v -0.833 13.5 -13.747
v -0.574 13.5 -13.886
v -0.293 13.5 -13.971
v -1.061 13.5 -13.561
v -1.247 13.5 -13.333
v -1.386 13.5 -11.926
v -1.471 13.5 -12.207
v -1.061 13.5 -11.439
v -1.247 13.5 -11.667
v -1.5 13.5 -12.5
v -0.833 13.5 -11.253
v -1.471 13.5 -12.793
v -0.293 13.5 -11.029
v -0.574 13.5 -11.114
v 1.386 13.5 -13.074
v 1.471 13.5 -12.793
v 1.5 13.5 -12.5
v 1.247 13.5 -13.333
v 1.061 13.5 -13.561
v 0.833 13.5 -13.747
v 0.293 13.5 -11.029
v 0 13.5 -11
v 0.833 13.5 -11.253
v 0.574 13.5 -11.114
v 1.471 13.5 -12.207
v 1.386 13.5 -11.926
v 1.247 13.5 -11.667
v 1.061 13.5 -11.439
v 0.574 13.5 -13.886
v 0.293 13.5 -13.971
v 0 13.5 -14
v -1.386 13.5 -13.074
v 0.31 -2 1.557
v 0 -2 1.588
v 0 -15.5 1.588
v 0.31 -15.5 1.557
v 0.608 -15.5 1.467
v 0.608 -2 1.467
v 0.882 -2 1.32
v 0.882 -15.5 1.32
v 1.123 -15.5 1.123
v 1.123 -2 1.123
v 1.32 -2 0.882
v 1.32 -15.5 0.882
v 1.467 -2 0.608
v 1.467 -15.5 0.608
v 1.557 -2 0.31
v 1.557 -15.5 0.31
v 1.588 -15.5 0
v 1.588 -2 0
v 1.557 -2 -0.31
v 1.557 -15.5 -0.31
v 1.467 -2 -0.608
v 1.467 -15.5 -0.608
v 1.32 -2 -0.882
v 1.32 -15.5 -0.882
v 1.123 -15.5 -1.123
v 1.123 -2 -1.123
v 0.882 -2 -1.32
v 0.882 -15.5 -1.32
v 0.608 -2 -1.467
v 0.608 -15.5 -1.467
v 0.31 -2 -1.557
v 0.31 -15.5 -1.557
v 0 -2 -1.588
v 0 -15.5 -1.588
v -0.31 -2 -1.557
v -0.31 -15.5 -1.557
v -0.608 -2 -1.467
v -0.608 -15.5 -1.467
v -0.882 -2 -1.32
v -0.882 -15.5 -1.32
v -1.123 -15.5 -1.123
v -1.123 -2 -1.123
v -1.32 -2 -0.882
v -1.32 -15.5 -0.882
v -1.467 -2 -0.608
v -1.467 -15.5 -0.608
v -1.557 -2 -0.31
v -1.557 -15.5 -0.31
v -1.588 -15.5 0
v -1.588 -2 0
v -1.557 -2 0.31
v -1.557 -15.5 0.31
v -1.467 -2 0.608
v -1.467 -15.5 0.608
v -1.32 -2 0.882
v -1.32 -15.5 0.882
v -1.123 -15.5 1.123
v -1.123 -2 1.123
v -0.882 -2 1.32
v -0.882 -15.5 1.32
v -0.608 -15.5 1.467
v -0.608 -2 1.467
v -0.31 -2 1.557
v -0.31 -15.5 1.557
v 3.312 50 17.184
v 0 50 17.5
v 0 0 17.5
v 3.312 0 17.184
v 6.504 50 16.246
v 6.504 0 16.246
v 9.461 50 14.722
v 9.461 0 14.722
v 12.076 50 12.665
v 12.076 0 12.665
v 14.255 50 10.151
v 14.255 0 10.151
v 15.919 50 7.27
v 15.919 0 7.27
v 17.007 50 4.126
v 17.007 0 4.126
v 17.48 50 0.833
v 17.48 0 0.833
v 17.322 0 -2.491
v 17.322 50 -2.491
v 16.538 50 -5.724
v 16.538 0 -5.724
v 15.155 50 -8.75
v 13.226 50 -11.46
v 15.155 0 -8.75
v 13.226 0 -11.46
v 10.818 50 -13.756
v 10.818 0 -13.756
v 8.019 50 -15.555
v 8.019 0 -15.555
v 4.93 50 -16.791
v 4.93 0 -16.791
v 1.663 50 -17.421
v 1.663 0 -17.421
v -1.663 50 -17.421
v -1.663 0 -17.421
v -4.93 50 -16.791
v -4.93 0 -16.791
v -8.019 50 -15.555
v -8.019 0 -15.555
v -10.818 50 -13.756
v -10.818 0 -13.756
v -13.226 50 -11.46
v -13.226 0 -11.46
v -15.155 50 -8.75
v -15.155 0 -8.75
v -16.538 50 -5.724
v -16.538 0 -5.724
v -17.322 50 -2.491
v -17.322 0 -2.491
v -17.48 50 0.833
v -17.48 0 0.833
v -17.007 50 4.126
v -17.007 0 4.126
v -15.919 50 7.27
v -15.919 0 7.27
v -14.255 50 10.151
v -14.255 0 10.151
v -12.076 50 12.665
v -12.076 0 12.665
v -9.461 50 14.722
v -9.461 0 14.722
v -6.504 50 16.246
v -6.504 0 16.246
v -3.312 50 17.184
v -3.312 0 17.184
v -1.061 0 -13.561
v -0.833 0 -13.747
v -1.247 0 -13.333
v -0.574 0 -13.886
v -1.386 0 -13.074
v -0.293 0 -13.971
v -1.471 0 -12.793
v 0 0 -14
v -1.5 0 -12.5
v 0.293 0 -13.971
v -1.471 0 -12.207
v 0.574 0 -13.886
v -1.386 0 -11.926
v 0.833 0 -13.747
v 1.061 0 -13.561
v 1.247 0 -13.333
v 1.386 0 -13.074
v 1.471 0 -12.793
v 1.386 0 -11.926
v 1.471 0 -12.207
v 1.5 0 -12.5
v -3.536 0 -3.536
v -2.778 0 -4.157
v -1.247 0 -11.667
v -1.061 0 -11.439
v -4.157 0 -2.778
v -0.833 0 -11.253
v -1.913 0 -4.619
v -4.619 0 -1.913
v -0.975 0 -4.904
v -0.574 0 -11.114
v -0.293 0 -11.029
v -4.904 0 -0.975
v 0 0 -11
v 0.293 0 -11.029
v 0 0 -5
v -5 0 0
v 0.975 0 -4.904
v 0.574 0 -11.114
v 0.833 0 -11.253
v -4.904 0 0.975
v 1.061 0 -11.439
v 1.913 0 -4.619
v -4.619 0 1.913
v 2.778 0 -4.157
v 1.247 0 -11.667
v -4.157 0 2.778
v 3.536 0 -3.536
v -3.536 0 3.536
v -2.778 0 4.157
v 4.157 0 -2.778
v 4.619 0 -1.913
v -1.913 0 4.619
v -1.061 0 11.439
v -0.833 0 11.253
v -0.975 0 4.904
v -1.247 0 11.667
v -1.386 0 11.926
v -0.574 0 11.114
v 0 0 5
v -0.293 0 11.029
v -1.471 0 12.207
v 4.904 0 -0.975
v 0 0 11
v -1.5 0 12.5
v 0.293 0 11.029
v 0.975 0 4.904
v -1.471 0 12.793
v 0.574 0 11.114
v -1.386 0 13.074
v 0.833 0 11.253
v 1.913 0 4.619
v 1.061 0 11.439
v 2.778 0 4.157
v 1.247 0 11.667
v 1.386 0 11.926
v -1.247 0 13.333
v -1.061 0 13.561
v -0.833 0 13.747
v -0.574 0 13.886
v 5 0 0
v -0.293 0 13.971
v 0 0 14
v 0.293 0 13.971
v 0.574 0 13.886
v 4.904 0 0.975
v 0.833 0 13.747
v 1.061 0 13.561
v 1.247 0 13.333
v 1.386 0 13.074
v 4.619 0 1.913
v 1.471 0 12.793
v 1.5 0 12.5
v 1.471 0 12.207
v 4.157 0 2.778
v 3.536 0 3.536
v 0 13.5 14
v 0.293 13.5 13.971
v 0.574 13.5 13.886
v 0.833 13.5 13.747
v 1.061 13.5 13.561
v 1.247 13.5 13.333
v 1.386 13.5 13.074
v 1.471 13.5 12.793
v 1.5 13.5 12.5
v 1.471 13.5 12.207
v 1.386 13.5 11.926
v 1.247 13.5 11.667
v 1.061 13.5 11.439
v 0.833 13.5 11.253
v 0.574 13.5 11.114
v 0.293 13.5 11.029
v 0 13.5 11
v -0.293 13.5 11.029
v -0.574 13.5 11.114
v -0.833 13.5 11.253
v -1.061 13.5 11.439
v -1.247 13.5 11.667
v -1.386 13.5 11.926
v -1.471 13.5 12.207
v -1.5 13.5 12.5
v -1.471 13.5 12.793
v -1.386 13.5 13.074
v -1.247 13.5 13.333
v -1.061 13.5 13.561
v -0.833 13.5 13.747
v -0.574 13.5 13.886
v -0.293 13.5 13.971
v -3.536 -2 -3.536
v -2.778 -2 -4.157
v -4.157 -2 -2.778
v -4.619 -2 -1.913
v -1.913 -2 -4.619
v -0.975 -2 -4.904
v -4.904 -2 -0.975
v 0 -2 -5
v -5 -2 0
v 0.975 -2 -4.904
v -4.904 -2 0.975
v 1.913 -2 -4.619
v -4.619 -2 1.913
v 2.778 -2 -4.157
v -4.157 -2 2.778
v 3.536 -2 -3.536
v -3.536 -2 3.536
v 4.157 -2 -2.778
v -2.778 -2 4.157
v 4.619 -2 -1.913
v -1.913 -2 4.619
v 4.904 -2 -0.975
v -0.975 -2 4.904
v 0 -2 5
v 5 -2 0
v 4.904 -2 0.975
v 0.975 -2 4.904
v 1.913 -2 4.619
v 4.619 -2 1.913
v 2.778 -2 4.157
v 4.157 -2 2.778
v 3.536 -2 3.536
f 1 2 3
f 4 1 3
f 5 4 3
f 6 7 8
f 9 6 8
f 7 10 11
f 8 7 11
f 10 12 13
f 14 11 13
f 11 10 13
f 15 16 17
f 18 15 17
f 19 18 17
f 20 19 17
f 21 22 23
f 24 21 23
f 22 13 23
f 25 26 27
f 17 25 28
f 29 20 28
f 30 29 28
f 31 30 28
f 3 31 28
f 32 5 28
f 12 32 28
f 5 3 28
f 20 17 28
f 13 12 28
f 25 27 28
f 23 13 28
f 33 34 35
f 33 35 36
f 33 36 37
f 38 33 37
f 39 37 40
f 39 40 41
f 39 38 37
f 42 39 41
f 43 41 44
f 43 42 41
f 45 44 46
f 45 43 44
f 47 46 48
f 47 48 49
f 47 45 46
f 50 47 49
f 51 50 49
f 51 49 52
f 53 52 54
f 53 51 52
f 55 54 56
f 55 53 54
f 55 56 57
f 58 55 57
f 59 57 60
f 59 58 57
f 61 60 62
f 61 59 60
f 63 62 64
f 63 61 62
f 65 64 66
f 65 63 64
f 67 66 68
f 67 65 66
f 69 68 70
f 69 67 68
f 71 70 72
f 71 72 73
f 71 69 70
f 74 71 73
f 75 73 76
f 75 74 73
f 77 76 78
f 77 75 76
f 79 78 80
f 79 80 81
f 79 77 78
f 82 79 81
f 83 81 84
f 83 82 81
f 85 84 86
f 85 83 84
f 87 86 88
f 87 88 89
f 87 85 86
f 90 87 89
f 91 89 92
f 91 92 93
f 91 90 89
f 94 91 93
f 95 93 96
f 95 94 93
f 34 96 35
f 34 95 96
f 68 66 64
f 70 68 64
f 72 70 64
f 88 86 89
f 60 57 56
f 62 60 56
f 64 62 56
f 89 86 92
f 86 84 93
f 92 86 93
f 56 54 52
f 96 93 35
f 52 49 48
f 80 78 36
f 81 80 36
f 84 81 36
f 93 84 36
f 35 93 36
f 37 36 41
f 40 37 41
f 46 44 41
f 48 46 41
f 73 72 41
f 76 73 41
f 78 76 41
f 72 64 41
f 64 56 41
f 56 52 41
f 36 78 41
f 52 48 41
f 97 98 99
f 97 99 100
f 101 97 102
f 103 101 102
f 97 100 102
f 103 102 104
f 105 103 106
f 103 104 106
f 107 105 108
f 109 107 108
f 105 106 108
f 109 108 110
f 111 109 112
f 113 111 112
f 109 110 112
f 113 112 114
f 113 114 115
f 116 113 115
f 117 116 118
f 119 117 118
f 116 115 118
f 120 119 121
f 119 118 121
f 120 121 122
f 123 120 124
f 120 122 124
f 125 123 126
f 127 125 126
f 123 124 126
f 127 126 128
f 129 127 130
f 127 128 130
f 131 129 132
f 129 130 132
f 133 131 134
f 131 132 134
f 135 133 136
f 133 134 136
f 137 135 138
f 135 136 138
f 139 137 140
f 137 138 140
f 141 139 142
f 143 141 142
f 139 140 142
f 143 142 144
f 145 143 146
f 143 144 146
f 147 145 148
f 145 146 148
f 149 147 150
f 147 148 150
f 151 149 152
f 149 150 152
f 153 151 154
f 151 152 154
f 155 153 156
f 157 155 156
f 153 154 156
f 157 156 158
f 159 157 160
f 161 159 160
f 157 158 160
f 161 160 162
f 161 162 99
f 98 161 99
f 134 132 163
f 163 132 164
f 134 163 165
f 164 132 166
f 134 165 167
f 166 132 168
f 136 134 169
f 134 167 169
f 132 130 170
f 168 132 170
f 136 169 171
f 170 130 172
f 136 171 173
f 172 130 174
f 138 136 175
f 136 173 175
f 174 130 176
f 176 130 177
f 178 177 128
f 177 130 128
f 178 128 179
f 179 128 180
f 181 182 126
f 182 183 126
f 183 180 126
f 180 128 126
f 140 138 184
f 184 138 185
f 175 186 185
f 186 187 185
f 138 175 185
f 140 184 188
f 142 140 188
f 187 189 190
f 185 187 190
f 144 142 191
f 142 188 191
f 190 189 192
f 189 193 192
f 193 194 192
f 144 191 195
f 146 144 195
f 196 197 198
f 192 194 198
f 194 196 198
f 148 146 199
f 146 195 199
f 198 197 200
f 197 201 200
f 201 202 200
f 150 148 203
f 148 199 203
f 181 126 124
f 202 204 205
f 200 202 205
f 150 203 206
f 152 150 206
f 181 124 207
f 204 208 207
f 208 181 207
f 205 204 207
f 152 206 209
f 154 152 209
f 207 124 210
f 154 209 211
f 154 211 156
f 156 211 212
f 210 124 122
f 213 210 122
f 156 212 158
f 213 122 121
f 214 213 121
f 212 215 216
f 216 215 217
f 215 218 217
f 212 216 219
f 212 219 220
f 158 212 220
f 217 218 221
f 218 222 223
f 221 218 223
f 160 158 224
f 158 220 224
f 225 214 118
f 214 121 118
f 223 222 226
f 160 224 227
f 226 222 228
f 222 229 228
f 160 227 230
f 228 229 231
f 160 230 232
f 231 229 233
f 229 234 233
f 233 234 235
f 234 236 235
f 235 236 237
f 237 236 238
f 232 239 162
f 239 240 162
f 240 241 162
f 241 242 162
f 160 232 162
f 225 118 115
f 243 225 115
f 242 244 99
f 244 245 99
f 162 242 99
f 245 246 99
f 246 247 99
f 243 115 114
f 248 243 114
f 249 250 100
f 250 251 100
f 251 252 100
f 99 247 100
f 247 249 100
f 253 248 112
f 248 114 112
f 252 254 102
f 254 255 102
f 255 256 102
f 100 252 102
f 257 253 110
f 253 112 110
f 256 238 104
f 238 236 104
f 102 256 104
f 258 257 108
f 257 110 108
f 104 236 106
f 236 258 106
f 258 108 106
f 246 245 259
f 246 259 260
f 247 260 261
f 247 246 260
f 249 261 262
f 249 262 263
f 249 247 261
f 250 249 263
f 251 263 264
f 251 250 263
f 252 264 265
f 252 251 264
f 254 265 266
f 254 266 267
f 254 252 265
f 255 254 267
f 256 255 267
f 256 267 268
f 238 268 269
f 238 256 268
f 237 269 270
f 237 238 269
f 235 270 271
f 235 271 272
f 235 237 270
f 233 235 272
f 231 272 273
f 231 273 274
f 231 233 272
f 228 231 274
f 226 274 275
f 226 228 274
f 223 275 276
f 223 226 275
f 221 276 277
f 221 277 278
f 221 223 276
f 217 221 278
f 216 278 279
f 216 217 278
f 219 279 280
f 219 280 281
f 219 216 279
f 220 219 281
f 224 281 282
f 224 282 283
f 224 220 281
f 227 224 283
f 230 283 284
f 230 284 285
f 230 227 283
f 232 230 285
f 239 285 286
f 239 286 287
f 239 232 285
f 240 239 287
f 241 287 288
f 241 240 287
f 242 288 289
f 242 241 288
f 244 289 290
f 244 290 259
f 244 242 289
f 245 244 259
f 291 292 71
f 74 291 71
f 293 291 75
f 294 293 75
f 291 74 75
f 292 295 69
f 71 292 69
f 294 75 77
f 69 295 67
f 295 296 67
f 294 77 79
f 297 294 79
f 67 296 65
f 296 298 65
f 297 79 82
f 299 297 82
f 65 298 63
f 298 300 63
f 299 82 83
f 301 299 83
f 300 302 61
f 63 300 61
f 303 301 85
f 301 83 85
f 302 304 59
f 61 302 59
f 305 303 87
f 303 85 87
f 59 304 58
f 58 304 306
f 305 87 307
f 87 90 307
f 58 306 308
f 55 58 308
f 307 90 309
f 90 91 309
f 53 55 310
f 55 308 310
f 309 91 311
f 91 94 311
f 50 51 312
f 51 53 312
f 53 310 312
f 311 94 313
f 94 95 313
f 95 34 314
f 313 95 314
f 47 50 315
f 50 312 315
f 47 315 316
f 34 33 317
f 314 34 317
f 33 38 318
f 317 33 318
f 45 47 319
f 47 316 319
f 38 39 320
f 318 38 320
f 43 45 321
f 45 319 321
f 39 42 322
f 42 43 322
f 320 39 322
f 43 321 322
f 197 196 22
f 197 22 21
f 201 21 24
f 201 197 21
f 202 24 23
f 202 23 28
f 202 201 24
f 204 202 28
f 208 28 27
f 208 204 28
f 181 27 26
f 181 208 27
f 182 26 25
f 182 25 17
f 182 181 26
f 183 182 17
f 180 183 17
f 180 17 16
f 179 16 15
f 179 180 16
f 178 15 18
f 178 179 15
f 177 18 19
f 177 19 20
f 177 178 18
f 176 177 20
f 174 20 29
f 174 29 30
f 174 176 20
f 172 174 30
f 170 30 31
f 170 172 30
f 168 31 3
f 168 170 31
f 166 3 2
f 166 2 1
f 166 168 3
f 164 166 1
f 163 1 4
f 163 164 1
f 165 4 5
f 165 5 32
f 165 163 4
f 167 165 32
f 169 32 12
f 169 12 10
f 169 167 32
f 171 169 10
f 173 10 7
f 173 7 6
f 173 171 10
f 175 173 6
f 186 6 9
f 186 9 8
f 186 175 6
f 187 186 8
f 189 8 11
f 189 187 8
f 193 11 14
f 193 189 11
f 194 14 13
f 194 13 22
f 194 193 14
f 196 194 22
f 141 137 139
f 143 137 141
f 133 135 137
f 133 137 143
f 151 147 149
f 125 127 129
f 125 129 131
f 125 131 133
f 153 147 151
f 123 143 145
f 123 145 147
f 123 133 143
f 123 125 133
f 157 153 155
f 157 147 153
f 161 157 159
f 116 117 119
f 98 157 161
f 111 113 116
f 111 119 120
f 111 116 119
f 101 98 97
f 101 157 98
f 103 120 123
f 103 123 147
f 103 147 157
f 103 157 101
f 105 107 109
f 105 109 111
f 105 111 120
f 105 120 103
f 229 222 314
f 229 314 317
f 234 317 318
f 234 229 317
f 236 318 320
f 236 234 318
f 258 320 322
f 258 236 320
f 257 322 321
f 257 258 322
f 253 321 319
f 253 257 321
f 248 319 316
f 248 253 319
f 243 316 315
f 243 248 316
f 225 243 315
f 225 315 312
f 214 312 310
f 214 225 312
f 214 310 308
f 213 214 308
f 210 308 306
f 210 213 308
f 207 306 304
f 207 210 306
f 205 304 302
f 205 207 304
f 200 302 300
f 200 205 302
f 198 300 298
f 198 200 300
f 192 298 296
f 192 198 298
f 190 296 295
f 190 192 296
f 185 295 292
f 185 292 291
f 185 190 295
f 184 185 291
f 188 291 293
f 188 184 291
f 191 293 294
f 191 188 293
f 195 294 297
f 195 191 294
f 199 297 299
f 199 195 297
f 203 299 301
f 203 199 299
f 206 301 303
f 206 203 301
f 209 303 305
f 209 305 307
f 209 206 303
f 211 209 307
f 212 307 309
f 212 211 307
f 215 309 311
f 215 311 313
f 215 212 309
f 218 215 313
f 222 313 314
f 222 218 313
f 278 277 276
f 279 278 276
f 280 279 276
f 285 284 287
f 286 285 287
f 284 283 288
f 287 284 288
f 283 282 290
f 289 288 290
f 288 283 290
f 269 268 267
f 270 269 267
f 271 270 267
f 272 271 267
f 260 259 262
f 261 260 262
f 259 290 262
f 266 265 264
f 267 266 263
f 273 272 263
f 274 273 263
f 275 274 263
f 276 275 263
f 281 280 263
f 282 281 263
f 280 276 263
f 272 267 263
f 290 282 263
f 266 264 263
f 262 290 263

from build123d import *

# Parameters (mm, degrees)
SKETCH1_R           = 17.5
BOSS_EXTRUDE1_DEPTH = 50
SKETCH1_3_R         = 5
BOSS_EXTRUDE2_DEPTH = 2
BOSS_EXTRUDE3_START = -2
SKETCH1_4_R         = 1.5875
BOSS_EXTRUDE3_DEPTH = 13.5
SKETCH1_5_R         = 1.5
CUT_EXTRUDE1_DEPTH  = 13.5


with BuildPart() as part:
    # Sketch1 → Boss-Extrude1 (new body)
    with BuildSketch(Plane(origin=(0, 0, 0), x_dir=(1, 0, 0), z_dir=(0, 1, 0))):
        with Locations(Location((0, 0, 0), (0, 0, 270))):
            Circle(SKETCH1_R)
    extrude(amount=BOSS_EXTRUDE1_DEPTH)

    # Sketch1<3> → Boss-Extrude2 (add)
    with BuildSketch(Plane(origin=(0, 0, 0), x_dir=(1, 0, 0), z_dir=(0, 1, 0))):
        with Locations(Location((0, 0, 0), (0, 0, 270))):
            Circle(SKETCH1_3_R)
    extrude(amount=-BOSS_EXTRUDE2_DEPTH)

    # Sketch1<4> → Boss-Extrude3 (add)
    with BuildSketch(Plane(origin=(0, 0, 0), x_dir=(1, 0, 0), z_dir=(0, 1, 0)).offset(BOSS_EXTRUDE3_START)):
        with Locations(Location((0, 0, 0), (0, 0, 270))):
            Circle(SKETCH1_4_R)
    extrude(amount=-BOSS_EXTRUDE3_DEPTH)

    # Sketch1<5> → Cut-Extrude1 (cut)
    with BuildSketch(Plane(origin=(0, 0, 0), x_dir=(1, 0, 0), z_dir=(0, 1, 0))):
        with Locations(Location((0, -12.5, 0), (0, 0, 270))):
            Circle(SKETCH1_5_R)
        with Locations(Location((0, 12.5, 0), (0, 0, 270))):
            Circle(SKETCH1_5_R)
    extrude(amount=CUT_EXTRUDE1_DEPTH, mode=Mode.SUBTRACT)


solid = part.part
